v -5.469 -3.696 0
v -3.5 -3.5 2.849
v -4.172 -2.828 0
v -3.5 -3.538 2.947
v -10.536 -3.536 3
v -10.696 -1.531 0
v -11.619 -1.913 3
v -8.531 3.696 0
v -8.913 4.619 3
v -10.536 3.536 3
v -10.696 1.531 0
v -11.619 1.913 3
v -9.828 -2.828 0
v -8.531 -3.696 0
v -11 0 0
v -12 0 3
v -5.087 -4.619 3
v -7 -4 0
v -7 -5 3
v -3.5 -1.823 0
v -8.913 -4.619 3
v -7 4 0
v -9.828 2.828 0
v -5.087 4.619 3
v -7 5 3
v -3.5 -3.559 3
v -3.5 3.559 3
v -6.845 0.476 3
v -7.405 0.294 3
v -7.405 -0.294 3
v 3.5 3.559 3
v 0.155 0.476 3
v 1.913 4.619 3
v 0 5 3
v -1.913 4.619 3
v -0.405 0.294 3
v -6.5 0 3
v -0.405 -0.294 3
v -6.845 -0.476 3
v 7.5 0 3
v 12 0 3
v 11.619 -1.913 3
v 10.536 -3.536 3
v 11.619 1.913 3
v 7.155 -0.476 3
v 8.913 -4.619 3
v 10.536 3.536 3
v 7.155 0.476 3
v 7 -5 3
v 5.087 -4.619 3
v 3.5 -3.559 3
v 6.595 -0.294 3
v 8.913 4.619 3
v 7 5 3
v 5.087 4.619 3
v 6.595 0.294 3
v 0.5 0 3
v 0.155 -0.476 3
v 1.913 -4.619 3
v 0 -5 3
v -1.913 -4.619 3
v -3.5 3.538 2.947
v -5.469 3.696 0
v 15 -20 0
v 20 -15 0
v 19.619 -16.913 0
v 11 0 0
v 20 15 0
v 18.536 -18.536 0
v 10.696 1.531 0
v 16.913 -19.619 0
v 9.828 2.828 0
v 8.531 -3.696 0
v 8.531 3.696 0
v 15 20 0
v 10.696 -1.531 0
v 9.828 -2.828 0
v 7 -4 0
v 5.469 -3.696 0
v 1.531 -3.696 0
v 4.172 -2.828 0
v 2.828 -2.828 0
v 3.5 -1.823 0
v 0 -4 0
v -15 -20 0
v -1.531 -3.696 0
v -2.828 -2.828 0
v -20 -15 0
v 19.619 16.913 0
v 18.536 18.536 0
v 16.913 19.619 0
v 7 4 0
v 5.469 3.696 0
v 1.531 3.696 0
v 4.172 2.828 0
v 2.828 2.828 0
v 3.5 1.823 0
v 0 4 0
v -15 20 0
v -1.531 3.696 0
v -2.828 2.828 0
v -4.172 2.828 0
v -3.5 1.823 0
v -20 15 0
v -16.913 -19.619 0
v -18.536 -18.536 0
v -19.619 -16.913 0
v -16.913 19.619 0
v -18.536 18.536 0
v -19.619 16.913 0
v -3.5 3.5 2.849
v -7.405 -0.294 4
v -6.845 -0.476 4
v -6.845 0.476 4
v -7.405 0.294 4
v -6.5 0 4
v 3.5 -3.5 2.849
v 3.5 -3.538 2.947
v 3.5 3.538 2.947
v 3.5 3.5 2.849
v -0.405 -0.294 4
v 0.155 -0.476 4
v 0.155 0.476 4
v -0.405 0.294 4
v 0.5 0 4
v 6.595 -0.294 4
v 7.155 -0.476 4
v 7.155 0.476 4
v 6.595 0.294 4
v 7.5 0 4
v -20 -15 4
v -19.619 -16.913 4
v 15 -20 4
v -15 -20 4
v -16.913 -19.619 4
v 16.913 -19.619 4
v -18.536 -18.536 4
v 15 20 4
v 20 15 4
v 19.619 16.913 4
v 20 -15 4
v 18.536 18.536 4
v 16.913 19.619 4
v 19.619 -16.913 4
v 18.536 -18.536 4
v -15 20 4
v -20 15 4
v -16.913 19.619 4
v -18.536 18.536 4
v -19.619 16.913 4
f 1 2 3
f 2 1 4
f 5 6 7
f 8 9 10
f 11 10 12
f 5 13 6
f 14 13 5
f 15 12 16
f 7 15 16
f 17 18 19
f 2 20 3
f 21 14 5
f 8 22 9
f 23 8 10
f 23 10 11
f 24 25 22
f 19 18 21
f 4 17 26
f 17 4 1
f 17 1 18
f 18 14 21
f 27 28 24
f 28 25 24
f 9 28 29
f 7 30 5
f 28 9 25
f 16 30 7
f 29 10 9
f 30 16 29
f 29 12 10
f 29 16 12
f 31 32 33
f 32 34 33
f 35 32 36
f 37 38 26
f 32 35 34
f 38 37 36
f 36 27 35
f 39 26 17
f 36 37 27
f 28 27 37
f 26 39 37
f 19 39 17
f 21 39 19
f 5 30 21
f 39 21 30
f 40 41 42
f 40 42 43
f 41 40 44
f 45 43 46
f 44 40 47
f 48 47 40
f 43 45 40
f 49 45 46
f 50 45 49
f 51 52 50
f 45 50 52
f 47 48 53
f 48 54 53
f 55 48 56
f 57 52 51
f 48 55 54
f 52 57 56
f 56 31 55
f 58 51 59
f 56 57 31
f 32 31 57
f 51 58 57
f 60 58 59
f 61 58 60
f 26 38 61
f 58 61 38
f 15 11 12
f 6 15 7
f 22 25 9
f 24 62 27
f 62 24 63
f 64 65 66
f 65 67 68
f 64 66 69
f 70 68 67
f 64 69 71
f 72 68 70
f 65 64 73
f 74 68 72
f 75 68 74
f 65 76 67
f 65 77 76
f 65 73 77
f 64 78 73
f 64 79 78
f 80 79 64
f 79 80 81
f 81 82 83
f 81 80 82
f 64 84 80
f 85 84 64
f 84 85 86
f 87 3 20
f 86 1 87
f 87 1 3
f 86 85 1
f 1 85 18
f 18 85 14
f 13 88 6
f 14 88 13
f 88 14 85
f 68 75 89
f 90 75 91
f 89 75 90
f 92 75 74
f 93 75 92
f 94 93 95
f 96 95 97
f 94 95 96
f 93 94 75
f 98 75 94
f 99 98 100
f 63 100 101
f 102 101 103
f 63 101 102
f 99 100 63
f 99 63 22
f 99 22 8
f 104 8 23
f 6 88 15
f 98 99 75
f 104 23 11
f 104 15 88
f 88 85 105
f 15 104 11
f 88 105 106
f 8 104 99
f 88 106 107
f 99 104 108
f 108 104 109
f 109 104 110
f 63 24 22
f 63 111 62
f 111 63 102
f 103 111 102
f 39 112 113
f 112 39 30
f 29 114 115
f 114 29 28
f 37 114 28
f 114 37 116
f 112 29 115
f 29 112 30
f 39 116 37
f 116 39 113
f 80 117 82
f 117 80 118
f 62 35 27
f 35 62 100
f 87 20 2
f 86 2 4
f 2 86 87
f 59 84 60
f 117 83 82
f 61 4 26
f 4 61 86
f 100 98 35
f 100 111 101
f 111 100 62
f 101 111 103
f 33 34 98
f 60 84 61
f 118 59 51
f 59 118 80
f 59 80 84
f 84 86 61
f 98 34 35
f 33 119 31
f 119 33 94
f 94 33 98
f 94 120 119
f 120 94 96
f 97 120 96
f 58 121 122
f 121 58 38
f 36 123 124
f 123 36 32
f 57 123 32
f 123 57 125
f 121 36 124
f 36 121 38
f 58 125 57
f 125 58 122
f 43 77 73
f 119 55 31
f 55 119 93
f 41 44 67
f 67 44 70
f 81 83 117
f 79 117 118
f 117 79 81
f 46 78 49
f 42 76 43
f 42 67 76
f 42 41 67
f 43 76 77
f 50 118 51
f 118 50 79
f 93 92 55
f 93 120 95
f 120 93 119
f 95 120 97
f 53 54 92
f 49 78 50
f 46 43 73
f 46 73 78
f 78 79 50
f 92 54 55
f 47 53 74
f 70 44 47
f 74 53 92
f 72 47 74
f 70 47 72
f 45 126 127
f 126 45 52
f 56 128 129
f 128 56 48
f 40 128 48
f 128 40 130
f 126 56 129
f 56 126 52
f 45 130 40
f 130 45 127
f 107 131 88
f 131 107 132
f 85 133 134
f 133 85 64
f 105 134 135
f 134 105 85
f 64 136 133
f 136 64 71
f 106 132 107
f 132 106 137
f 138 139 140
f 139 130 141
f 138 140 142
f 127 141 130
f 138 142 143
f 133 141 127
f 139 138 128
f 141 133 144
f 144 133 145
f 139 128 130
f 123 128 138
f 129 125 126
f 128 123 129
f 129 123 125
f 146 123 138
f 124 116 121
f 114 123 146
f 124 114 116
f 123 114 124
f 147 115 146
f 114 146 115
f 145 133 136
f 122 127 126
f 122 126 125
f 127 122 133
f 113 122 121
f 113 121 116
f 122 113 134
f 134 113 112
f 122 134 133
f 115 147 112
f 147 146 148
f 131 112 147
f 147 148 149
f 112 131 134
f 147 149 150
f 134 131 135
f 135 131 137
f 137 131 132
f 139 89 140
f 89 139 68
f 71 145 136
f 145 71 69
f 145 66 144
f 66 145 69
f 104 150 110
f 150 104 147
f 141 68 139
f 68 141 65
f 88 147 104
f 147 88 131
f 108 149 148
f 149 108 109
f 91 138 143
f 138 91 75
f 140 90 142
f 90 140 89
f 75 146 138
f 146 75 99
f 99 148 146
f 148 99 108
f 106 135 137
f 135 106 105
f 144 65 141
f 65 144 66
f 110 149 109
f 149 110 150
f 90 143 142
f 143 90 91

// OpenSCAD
difference() {
    wid = 30;
    hei = 4;
	union() {
		translate(v = [0, 0, 0]) {
			rotate(a = [0, 0, 0]) {
				hull() {
					translate(v = [wid/2, wid/2, 0]) {
						rotate(a = [0, 0, 0]) {
							translate(v = [0, 0, 0]) {
								rotate(a = [0, 0, 0]) {
									cylinder(h = hei, r = 5);
								}
							}
						}
					}
					translate(v = [wid/2, -wid/2, 0]) {
						rotate(a = [0, 0, 0]) {
							translate(v = [0, 0, 0]) {
								rotate(a = [0, 0, 0]) {
									cylinder(h = hei, r = 5);
								}
							}
						}
					}
					translate(v = [-wid/2, wid/2, 0]) {
						rotate(a = [0, 0, 0]) {
							translate(v = [0, 0, 0]) {
								rotate(a = [0, 0, 0]) {
									cylinder(h = hei, r = 5);
								}
							}
						}
					}
					translate(v = [-wid/2, -wid/2, 0]) {
						rotate(a = [0, 0, 0]) {
							translate(v = [0, 0, 0]) {
								rotate(a = [0, 0, 0]) {
									cylinder(h = hei, r = 5);
								}
							}
						}
					}
				}
			}
		}
	}
    union(){
        horn_hei = 3;
        spac = 7;
        translate([-spac,0,0]){
            cylinder(h=horn_hei, r1=4, r2=5);
            translate([0,0,-50]){
                cylinder(h=100, r=0.5);
            }
        }
        translate([0,0,0]){
            cylinder(h=horn_hei, r1=4, r2=5);
            translate([0,0,-50]){
                cylinder(h=100, r=0.5);
            }
        }
        translate([spac,0,0]){
            cylinder(h=horn_hei, r1=4, r2=5);
            translate([0,0,-50]){
                cylinder(h=100, r=0.5);
            }
        }
    }
}
